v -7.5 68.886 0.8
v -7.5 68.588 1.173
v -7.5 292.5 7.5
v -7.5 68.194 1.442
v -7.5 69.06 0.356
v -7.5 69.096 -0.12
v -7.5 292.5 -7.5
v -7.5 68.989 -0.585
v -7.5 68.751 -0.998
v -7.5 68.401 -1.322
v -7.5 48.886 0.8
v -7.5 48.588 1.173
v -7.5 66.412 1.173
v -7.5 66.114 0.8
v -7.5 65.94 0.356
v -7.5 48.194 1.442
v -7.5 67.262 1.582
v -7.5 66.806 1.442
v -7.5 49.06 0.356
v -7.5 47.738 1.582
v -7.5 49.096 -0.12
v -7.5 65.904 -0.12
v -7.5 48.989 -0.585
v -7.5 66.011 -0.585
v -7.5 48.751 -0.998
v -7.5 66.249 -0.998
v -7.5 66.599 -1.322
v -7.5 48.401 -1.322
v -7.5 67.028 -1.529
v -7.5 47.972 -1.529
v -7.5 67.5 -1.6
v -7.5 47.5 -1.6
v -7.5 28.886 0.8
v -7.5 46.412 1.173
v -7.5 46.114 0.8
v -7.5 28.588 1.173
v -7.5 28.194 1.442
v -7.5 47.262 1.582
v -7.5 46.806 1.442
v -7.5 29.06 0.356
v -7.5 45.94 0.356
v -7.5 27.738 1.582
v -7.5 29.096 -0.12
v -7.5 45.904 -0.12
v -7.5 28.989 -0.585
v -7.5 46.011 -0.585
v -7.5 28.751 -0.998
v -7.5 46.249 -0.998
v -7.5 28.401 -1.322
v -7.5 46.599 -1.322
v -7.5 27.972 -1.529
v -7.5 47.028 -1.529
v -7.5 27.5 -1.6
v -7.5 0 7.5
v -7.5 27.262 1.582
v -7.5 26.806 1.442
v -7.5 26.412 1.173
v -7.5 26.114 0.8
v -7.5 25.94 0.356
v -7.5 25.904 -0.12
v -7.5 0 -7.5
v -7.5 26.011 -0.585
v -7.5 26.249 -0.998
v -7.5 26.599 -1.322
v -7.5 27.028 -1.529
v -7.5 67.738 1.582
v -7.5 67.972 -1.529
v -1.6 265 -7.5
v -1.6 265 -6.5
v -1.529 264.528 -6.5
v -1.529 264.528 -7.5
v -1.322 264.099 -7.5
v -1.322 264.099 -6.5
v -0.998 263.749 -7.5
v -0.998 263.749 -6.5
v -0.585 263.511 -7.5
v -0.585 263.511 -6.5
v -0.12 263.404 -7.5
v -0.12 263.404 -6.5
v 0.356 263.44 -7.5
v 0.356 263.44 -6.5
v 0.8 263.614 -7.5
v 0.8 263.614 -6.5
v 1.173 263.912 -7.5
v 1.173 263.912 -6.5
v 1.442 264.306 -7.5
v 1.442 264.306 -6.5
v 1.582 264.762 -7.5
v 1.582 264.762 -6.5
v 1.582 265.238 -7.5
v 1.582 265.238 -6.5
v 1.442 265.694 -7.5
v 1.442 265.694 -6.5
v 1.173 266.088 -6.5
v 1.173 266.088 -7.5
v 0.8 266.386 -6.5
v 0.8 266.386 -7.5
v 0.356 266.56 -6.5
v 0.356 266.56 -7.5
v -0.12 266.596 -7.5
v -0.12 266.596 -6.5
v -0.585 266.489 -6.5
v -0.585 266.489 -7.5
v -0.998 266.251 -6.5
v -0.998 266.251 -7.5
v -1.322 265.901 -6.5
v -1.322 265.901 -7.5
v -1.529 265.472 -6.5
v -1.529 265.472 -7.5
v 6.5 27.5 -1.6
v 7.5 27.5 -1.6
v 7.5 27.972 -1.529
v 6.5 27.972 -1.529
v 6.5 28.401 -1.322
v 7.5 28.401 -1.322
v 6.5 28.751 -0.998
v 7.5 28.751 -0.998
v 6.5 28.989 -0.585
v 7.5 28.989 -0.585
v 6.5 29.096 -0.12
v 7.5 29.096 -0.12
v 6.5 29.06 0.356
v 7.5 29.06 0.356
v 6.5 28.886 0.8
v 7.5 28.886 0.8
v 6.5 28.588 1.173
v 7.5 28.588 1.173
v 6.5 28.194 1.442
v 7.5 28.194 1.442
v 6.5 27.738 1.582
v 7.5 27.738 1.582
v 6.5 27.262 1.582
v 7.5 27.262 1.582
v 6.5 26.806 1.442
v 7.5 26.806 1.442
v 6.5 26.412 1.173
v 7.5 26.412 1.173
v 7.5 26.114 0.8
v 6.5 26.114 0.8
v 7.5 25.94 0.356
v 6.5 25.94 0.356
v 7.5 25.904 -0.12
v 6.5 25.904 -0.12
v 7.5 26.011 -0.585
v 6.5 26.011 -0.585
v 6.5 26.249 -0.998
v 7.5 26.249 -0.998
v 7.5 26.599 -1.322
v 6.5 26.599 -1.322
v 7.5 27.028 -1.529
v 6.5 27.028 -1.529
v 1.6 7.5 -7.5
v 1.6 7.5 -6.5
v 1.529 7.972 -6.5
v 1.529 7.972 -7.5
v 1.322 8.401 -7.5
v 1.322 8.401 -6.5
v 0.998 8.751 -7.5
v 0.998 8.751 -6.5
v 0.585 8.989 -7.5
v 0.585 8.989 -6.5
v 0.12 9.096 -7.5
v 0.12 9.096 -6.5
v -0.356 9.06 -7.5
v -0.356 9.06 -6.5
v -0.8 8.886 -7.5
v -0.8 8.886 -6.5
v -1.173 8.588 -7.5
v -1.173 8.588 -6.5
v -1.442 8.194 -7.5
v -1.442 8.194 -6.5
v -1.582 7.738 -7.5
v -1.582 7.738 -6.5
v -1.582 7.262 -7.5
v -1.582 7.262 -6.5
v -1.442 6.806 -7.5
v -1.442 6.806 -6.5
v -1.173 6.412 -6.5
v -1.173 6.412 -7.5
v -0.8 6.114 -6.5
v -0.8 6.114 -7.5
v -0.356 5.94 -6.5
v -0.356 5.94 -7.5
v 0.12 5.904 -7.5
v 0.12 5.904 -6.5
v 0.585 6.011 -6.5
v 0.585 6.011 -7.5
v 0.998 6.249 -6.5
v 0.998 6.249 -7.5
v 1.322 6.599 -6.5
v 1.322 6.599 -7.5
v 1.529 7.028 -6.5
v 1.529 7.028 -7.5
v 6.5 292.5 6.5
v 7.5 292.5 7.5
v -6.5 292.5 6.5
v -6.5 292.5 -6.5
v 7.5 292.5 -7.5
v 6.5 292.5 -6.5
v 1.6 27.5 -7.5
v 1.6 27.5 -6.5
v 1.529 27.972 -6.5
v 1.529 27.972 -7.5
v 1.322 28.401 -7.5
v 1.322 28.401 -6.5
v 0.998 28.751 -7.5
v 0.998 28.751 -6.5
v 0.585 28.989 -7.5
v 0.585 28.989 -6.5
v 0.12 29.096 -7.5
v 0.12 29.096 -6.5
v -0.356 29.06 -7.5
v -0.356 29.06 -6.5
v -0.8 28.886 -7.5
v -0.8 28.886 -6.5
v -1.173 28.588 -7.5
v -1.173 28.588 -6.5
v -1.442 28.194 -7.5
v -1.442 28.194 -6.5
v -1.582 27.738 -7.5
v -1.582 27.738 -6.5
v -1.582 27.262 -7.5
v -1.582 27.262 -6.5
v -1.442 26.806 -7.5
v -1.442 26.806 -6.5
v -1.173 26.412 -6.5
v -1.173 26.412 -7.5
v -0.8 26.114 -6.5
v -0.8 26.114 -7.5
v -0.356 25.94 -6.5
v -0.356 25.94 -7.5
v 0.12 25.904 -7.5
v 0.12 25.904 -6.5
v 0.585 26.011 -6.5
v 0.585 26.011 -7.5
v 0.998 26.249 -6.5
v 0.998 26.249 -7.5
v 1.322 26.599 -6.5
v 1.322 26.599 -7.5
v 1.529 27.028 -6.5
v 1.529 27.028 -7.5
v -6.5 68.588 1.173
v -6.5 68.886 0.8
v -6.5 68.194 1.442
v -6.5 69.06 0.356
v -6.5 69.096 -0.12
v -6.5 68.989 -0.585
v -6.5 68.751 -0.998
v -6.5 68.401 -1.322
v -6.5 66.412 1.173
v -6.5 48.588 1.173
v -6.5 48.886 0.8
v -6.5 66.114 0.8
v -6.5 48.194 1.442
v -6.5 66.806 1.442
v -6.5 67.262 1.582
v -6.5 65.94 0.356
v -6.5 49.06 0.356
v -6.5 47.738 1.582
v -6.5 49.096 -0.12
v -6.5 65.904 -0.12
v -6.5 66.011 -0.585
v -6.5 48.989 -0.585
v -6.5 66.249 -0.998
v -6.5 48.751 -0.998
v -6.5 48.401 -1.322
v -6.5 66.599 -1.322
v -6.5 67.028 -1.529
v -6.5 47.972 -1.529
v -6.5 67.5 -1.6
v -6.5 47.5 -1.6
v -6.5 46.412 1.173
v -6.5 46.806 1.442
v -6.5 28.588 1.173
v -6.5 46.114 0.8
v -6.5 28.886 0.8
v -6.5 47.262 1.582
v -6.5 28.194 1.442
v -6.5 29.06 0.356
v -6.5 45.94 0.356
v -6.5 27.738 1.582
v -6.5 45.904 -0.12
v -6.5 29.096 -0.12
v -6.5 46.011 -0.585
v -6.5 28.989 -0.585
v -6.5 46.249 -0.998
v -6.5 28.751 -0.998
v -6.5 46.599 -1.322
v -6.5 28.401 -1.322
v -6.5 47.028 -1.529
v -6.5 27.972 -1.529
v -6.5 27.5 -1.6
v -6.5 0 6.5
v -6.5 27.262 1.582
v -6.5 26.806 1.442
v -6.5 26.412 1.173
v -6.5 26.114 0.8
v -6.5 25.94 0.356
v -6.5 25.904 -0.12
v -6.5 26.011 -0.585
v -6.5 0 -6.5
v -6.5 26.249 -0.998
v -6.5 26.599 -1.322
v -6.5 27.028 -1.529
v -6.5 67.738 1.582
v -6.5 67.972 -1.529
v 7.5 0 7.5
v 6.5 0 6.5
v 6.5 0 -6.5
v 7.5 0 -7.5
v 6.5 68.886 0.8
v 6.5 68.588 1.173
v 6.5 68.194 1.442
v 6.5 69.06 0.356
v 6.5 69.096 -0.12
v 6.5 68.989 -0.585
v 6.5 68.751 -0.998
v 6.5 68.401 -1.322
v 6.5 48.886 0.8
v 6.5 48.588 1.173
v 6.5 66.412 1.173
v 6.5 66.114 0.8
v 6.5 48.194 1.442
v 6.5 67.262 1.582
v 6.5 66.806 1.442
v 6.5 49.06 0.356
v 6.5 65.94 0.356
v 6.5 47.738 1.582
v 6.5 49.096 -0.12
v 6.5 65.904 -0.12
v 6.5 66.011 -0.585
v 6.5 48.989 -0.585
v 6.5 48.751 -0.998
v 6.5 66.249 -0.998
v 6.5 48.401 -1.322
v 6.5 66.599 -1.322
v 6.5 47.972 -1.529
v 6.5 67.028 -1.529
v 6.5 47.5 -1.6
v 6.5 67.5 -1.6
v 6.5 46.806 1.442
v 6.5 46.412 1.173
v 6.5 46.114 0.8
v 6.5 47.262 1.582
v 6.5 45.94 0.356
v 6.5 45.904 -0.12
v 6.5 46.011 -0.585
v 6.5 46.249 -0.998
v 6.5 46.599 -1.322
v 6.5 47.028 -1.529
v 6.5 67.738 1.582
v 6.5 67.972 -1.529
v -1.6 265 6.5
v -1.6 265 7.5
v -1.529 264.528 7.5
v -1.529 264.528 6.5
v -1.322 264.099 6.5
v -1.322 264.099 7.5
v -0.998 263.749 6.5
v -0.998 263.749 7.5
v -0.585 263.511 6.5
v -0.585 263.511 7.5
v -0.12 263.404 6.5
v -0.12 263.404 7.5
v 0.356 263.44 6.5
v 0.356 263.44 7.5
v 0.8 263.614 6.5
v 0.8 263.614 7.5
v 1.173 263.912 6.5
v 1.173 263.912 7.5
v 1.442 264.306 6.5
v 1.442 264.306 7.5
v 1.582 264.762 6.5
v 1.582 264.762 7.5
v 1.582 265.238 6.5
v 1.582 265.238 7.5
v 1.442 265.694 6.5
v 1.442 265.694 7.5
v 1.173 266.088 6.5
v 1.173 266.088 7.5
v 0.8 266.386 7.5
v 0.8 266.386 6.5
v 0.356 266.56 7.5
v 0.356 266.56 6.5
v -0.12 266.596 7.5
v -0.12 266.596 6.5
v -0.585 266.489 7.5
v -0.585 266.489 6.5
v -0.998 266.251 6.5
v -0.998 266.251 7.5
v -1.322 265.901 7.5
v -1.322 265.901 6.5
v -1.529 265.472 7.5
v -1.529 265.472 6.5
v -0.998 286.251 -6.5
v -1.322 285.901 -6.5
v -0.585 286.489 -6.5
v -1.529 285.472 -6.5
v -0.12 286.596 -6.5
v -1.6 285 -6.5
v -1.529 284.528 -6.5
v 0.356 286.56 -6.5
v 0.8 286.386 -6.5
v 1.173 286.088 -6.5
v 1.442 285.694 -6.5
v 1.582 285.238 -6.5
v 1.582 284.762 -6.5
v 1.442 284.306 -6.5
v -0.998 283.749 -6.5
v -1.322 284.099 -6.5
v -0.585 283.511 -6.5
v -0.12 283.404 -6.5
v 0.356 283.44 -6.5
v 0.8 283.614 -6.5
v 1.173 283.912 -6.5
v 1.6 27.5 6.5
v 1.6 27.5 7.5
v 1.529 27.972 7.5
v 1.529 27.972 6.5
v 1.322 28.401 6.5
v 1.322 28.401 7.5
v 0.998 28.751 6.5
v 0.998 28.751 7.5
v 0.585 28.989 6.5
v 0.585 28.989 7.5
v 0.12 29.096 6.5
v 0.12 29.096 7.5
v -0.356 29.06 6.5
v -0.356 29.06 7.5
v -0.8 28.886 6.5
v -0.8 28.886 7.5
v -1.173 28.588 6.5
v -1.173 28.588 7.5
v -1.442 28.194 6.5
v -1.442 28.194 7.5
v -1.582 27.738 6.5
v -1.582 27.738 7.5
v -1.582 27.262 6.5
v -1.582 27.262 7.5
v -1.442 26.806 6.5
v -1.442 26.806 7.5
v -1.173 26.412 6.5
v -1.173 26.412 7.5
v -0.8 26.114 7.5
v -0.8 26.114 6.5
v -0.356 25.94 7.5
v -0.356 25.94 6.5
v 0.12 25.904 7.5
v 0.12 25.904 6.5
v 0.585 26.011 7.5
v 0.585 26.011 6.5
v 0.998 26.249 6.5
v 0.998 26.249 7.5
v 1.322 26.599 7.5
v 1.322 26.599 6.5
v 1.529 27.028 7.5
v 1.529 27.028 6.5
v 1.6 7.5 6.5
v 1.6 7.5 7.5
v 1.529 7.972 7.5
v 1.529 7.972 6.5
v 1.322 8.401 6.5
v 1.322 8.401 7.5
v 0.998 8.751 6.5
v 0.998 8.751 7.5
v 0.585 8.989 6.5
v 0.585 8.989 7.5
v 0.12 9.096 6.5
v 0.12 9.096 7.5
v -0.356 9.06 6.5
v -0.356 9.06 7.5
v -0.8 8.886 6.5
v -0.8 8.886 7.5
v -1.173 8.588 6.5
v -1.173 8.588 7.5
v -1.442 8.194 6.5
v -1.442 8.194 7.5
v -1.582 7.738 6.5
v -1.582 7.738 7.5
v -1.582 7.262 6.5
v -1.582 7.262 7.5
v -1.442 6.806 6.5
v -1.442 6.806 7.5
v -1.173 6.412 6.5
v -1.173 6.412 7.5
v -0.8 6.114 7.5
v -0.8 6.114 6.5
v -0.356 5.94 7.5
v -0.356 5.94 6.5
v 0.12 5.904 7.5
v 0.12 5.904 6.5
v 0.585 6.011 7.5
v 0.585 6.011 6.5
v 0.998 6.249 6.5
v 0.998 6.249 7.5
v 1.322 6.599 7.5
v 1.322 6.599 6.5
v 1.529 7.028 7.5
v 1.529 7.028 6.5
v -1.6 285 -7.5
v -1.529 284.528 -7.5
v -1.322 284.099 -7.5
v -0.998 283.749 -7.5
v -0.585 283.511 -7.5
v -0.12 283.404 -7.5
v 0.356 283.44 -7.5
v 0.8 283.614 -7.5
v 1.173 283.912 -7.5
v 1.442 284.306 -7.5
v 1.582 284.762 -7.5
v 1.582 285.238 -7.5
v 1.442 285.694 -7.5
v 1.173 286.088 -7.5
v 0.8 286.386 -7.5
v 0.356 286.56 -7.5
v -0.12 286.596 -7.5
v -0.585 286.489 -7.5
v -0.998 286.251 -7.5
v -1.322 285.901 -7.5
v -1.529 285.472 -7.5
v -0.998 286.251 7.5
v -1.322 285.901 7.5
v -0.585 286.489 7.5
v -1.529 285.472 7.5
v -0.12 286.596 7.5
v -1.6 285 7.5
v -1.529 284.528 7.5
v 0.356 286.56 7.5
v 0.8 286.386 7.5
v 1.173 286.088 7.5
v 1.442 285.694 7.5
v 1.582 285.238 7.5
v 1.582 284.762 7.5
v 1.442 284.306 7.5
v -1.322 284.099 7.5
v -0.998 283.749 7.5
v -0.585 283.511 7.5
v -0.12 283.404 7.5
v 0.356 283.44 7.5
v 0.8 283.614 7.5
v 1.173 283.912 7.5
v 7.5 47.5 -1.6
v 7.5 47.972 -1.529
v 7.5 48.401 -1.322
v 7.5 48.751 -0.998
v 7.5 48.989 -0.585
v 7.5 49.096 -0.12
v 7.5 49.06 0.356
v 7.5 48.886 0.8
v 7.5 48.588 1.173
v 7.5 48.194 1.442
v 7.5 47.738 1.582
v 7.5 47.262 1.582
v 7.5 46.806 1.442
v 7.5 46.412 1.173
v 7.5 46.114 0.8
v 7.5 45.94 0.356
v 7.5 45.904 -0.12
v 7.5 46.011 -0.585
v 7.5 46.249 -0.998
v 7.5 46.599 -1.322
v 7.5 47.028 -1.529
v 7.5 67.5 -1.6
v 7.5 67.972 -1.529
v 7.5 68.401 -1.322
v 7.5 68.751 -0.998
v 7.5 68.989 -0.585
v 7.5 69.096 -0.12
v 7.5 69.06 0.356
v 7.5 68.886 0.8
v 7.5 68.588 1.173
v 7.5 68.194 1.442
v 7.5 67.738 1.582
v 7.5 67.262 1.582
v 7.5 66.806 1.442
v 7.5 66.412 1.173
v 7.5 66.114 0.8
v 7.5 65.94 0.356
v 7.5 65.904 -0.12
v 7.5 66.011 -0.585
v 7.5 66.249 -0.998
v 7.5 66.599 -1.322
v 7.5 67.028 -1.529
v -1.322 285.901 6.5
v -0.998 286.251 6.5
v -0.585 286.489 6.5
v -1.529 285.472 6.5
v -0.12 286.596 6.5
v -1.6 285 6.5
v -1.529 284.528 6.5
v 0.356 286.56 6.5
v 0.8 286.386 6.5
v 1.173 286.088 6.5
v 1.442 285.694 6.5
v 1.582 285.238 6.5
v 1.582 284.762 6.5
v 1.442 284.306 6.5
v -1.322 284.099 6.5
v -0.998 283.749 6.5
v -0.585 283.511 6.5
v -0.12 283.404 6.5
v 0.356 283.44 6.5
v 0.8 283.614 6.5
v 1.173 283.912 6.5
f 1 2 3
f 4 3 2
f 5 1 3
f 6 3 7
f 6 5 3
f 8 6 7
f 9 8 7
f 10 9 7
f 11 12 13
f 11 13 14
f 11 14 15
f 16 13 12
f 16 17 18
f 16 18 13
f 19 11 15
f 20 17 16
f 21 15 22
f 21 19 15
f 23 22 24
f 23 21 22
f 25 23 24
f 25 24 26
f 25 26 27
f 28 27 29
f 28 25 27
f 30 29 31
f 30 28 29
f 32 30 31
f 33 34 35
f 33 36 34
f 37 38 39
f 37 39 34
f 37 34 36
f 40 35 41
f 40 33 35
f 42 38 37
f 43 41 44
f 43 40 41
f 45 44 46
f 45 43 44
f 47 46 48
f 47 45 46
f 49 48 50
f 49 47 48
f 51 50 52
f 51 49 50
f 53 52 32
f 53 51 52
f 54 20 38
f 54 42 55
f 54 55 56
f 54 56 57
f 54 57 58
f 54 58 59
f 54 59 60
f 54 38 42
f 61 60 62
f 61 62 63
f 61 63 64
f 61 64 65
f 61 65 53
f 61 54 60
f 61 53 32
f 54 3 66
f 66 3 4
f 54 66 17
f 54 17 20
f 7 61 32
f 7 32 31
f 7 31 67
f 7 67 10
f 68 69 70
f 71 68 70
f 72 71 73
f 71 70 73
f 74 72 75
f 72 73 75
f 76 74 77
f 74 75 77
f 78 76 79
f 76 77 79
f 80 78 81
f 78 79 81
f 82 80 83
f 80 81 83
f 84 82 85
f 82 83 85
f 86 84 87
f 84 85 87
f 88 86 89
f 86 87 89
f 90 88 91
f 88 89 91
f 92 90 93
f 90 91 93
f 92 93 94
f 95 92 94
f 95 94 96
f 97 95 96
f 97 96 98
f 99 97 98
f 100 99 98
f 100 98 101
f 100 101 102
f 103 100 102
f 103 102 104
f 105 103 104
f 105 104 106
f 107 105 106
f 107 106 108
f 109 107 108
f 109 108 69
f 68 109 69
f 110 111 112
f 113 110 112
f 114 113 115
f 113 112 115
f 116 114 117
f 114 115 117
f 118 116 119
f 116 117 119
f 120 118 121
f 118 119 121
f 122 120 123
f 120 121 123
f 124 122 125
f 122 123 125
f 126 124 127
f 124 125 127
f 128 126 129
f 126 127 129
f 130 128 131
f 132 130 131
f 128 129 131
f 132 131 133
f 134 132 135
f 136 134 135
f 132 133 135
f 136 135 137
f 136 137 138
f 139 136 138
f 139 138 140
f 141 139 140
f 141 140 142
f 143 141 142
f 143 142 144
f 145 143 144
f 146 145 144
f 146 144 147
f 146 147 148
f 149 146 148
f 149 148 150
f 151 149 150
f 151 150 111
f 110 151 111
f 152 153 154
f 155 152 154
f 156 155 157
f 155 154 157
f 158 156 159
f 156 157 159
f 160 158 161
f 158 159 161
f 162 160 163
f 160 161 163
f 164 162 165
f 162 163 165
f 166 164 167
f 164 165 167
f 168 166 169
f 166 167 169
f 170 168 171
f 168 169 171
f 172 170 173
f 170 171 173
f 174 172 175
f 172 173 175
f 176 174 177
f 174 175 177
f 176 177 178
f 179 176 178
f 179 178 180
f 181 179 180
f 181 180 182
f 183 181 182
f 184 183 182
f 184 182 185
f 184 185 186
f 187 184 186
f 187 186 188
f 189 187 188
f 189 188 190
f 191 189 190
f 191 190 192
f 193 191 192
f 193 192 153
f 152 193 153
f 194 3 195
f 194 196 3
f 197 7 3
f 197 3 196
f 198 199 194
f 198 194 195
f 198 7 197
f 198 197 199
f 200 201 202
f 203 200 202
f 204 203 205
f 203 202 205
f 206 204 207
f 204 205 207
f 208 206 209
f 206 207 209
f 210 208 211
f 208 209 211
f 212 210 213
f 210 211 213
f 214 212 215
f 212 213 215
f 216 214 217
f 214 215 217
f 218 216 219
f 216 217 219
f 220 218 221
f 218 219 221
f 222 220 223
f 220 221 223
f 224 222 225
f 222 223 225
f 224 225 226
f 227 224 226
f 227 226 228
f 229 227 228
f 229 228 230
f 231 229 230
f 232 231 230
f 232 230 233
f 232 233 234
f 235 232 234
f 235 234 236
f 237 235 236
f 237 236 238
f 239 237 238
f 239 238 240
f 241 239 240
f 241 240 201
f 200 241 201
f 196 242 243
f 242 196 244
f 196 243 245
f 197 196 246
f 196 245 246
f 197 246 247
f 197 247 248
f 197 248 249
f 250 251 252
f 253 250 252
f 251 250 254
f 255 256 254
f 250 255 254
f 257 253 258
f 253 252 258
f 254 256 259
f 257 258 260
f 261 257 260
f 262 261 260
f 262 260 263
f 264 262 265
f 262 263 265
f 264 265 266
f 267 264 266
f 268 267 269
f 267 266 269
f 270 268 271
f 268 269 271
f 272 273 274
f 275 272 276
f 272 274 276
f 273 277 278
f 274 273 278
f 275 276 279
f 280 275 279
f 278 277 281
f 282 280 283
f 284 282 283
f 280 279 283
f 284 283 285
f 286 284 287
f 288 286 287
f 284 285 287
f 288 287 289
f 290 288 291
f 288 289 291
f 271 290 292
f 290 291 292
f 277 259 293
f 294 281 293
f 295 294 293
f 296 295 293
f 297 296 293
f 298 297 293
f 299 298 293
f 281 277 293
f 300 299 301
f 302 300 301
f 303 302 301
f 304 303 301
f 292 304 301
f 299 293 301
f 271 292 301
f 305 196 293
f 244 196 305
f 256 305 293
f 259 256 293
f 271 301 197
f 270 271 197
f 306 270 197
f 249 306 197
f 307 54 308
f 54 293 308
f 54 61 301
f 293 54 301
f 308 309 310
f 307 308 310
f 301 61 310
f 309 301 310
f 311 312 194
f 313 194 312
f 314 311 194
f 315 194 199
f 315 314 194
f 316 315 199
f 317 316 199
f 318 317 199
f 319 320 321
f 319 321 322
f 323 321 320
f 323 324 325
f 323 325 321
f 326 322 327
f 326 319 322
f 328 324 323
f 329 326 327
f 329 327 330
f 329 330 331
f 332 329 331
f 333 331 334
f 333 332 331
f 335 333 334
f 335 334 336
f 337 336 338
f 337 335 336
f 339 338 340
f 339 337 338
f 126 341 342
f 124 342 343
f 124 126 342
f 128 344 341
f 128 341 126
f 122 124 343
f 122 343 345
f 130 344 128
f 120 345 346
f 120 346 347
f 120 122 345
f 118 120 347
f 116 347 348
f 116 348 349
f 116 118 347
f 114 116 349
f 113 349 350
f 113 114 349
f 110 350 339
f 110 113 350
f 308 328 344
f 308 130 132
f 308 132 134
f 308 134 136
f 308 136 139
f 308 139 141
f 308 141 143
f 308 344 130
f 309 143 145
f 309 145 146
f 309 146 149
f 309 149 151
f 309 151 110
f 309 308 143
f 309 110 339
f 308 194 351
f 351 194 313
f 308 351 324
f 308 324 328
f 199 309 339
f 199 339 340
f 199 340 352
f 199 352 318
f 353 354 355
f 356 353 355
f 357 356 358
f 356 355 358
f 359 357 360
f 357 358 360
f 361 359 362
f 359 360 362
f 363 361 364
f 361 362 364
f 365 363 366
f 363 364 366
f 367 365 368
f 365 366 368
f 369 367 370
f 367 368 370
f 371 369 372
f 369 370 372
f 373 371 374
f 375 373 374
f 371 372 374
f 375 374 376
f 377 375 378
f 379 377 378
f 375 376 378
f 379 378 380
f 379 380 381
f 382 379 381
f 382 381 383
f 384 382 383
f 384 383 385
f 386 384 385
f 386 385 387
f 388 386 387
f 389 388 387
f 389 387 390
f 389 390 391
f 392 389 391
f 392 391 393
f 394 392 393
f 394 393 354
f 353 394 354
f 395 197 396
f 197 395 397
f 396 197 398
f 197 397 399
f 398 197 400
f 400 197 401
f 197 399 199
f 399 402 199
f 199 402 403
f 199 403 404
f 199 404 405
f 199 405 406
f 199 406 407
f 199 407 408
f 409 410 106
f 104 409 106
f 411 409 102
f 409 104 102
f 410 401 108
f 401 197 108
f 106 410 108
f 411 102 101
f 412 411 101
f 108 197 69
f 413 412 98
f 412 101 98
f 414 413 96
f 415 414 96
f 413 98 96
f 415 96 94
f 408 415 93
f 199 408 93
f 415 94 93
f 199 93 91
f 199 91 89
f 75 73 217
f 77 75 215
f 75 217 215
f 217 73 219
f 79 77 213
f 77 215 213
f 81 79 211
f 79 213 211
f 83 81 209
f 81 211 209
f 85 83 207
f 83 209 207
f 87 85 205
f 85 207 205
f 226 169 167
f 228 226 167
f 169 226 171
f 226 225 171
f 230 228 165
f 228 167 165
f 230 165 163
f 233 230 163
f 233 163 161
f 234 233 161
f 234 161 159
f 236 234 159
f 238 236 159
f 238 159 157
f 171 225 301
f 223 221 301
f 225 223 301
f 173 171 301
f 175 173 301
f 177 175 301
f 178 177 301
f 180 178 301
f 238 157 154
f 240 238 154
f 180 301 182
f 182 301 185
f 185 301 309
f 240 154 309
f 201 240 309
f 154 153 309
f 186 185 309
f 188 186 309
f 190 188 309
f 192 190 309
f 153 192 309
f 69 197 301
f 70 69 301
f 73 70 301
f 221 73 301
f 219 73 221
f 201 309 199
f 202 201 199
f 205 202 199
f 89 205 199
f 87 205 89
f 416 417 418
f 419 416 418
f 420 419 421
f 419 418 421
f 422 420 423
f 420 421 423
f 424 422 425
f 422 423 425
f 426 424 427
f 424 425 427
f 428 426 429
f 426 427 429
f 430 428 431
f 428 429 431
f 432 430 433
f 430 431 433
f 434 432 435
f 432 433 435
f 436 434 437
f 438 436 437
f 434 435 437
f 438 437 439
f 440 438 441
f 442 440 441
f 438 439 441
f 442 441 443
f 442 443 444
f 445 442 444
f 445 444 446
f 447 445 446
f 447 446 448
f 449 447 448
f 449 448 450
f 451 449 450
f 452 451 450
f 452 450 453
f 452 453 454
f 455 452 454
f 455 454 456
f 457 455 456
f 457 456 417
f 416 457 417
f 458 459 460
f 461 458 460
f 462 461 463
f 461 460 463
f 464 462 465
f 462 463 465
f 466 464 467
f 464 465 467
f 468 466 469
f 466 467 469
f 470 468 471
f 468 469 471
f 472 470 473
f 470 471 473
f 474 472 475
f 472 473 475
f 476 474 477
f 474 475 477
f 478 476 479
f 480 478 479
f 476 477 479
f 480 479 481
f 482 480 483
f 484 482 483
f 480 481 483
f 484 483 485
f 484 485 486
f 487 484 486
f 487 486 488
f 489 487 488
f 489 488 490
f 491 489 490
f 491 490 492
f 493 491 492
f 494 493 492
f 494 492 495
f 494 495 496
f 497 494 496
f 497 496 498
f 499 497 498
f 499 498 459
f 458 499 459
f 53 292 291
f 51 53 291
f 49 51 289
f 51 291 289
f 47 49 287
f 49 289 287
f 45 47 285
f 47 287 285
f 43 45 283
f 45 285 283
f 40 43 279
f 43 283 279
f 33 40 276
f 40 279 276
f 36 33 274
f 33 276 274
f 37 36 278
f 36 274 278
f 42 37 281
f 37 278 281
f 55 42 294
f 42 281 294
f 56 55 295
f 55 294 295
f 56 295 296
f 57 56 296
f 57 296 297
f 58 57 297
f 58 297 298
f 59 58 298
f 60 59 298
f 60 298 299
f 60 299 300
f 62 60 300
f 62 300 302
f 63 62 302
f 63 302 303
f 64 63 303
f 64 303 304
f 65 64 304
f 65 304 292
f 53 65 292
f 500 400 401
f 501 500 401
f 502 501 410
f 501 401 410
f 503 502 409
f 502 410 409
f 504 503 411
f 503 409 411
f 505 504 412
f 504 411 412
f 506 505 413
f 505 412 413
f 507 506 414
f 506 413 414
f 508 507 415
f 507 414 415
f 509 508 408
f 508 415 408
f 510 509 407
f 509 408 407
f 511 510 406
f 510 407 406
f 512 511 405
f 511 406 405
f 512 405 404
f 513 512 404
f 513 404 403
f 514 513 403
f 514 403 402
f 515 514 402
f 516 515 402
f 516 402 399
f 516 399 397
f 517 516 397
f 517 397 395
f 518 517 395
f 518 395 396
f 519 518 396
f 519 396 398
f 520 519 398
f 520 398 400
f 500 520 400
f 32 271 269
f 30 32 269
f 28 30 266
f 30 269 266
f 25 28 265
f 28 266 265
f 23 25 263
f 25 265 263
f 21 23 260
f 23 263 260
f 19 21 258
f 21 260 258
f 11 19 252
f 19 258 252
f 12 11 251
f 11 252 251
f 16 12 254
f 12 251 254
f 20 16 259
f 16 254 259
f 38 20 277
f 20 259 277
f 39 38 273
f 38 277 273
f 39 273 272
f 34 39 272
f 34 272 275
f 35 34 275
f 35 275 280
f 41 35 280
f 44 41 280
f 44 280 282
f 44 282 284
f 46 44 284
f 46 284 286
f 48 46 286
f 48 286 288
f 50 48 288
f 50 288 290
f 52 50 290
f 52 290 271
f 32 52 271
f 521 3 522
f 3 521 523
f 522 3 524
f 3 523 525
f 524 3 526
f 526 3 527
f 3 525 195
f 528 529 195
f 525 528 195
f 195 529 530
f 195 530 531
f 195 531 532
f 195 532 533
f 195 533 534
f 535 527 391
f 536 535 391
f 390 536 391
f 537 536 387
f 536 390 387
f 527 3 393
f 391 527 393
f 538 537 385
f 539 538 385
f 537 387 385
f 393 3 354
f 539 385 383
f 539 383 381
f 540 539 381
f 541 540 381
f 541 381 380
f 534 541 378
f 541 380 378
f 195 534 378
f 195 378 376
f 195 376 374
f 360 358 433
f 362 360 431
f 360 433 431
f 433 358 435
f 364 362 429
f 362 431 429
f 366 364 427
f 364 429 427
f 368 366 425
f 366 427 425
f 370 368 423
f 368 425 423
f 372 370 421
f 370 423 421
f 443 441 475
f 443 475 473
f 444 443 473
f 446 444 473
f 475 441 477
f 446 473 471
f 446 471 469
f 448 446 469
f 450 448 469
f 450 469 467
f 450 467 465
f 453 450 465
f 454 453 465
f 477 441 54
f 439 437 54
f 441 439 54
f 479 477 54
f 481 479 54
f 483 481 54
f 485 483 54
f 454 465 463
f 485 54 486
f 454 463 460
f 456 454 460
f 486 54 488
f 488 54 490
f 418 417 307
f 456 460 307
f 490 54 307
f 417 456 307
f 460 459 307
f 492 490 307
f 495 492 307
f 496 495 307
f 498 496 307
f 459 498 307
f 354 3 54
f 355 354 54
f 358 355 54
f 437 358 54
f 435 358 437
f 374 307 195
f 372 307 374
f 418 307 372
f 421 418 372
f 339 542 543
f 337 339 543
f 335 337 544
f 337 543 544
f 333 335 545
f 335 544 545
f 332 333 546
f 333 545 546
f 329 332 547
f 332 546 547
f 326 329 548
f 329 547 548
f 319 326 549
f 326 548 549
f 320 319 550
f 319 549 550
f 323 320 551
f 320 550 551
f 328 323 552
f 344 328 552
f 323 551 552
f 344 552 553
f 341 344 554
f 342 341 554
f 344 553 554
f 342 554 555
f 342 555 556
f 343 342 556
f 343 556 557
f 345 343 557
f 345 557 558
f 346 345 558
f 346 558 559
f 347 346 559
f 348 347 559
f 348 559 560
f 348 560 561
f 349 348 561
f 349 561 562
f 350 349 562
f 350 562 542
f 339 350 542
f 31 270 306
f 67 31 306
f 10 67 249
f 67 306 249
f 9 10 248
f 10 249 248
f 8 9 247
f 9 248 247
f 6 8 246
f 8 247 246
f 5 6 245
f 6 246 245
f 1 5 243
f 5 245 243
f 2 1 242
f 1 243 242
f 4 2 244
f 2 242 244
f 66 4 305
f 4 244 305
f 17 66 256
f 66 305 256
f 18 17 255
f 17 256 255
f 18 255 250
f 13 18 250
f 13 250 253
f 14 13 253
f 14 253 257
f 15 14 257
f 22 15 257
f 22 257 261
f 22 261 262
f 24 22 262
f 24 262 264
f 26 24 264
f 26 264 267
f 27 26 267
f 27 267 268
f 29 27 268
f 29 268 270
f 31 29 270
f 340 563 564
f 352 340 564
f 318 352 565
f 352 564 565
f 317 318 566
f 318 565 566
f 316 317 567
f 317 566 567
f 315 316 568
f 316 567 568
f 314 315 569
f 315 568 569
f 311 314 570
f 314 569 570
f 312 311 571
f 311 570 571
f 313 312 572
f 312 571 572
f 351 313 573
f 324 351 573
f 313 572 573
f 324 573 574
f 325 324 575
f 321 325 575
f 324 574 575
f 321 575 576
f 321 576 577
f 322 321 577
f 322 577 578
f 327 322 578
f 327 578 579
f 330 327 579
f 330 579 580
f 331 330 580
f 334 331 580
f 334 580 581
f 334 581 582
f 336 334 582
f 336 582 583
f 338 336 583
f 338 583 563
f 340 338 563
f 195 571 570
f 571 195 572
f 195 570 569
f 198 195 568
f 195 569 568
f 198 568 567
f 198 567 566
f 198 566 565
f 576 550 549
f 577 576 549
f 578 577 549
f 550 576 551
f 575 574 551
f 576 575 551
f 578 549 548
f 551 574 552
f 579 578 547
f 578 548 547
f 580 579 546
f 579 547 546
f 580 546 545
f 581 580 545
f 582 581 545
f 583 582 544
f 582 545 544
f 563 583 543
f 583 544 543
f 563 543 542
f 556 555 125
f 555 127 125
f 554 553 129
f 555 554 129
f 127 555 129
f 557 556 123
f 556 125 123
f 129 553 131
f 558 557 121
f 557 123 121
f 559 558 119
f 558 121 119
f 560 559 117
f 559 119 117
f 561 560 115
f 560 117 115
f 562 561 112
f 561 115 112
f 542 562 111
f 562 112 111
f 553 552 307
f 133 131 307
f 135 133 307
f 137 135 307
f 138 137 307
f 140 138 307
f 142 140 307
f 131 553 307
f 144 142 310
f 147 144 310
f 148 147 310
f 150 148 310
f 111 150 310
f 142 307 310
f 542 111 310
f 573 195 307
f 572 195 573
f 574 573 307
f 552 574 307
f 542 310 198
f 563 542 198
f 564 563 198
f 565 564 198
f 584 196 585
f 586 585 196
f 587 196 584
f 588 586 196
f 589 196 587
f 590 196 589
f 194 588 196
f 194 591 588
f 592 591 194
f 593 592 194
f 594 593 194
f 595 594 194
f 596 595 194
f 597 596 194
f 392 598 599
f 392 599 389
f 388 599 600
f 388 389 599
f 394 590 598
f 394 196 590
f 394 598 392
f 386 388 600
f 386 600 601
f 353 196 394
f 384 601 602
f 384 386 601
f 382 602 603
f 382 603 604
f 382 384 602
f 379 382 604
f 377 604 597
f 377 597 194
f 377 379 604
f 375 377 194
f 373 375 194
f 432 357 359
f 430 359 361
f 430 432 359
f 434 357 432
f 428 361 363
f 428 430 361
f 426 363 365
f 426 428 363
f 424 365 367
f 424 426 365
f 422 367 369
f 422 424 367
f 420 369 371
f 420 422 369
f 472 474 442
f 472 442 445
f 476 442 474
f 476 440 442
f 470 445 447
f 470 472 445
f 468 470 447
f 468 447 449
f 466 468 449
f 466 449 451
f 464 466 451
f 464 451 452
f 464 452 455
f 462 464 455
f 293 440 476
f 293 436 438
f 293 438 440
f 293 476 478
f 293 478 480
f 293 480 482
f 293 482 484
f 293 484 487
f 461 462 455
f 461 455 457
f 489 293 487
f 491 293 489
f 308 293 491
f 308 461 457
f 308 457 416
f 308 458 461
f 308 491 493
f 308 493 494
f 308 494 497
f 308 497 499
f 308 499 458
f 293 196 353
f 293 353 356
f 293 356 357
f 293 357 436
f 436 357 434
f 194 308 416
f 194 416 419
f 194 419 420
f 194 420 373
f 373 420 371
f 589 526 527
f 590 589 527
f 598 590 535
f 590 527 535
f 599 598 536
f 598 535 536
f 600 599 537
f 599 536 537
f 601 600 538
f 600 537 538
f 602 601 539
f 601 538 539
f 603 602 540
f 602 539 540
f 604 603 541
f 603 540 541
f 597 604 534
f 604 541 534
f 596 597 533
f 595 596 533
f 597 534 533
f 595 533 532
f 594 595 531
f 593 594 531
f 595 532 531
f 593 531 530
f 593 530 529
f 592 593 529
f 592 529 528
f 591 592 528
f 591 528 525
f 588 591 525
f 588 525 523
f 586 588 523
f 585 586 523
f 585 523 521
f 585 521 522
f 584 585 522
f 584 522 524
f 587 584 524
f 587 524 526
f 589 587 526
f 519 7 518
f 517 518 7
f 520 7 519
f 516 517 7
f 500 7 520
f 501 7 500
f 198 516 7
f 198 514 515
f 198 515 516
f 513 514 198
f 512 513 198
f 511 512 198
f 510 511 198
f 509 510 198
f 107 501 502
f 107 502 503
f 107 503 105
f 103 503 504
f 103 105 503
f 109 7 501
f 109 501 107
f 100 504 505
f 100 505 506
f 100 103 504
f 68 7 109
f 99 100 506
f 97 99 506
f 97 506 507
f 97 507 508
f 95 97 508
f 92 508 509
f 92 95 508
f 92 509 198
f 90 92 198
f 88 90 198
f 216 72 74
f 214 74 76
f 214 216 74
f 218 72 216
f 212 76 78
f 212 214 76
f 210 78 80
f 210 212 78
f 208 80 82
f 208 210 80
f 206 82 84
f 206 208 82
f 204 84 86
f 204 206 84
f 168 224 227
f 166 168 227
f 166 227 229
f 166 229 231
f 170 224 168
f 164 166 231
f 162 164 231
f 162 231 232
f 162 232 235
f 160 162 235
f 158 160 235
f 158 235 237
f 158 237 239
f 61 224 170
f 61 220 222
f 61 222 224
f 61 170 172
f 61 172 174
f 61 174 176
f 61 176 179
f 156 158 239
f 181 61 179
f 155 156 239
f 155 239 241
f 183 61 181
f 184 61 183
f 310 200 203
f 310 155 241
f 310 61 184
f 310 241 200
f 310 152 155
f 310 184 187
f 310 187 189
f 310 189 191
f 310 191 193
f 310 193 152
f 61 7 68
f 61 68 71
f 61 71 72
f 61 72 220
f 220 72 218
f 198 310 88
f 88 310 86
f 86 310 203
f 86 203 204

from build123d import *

# Parameters (mm, degrees)
SKETCH_1_W          = 15
SKETCH_1_H          = 15
SKETCH_1_W_2        = 13
SKETCH_1_H_2        = 13
EXTRUDE_1_DEPTH     = 292.5
SKETCH_2_R          = 1.6
CUT_EXTRUDE_1_DEPTH = 293.980374769
SKETCH_3_R          = 1.6
CUT_EXTRUDE_2_DEPTH = 293.980374769


with BuildPart() as part:
    # 草图1 → 拉伸-薄壁1 (new body)
    with BuildSketch(Plane(origin=(0, 0, 0), x_dir=(1, 0, 0), z_dir=(0, 1, 0))):
        Rectangle(SKETCH_1_W, SKETCH_1_H)
        Rectangle(SKETCH_1_W_2, SKETCH_1_H_2, mode=Mode.SUBTRACT)
    extrude(amount=EXTRUDE_1_DEPTH)

    # 草图2 → 切除-拉伸1 (cut, through all)
    with BuildSketch(Plane.XY.offset(7.5)):
        with Locations((0, 7.5)):
            Circle(SKETCH_2_R)
        with Locations((0, 27.5)):
            Circle(SKETCH_2_R)
        with Locations(Location((0, 265, 0), (0, 0, 180))):
            Circle(SKETCH_2_R)
        with Locations(Location((0, 285, 0), (0, 0, 180))):
            Circle(SKETCH_2_R)
    extrude(amount=-CUT_EXTRUDE_1_DEPTH, mode=Mode.SUBTRACT)

    # 草图3 → 切除-拉伸2 (cut, through all)
    with BuildSketch(Plane(origin=(7.5, 0, 0), x_dir=(0, 0, -1), z_dir=(1, 0, 0))):
        with Locations((0, 27.5)):
            Circle(SKETCH_3_R)
        with Locations((0, 47.5)):
            Circle(SKETCH_3_R)
        with Locations((0, 67.5)):
            Circle(SKETCH_3_R)
    extrude(amount=-CUT_EXTRUDE_2_DEPTH, mode=Mode.SUBTRACT)


solid = part.part
